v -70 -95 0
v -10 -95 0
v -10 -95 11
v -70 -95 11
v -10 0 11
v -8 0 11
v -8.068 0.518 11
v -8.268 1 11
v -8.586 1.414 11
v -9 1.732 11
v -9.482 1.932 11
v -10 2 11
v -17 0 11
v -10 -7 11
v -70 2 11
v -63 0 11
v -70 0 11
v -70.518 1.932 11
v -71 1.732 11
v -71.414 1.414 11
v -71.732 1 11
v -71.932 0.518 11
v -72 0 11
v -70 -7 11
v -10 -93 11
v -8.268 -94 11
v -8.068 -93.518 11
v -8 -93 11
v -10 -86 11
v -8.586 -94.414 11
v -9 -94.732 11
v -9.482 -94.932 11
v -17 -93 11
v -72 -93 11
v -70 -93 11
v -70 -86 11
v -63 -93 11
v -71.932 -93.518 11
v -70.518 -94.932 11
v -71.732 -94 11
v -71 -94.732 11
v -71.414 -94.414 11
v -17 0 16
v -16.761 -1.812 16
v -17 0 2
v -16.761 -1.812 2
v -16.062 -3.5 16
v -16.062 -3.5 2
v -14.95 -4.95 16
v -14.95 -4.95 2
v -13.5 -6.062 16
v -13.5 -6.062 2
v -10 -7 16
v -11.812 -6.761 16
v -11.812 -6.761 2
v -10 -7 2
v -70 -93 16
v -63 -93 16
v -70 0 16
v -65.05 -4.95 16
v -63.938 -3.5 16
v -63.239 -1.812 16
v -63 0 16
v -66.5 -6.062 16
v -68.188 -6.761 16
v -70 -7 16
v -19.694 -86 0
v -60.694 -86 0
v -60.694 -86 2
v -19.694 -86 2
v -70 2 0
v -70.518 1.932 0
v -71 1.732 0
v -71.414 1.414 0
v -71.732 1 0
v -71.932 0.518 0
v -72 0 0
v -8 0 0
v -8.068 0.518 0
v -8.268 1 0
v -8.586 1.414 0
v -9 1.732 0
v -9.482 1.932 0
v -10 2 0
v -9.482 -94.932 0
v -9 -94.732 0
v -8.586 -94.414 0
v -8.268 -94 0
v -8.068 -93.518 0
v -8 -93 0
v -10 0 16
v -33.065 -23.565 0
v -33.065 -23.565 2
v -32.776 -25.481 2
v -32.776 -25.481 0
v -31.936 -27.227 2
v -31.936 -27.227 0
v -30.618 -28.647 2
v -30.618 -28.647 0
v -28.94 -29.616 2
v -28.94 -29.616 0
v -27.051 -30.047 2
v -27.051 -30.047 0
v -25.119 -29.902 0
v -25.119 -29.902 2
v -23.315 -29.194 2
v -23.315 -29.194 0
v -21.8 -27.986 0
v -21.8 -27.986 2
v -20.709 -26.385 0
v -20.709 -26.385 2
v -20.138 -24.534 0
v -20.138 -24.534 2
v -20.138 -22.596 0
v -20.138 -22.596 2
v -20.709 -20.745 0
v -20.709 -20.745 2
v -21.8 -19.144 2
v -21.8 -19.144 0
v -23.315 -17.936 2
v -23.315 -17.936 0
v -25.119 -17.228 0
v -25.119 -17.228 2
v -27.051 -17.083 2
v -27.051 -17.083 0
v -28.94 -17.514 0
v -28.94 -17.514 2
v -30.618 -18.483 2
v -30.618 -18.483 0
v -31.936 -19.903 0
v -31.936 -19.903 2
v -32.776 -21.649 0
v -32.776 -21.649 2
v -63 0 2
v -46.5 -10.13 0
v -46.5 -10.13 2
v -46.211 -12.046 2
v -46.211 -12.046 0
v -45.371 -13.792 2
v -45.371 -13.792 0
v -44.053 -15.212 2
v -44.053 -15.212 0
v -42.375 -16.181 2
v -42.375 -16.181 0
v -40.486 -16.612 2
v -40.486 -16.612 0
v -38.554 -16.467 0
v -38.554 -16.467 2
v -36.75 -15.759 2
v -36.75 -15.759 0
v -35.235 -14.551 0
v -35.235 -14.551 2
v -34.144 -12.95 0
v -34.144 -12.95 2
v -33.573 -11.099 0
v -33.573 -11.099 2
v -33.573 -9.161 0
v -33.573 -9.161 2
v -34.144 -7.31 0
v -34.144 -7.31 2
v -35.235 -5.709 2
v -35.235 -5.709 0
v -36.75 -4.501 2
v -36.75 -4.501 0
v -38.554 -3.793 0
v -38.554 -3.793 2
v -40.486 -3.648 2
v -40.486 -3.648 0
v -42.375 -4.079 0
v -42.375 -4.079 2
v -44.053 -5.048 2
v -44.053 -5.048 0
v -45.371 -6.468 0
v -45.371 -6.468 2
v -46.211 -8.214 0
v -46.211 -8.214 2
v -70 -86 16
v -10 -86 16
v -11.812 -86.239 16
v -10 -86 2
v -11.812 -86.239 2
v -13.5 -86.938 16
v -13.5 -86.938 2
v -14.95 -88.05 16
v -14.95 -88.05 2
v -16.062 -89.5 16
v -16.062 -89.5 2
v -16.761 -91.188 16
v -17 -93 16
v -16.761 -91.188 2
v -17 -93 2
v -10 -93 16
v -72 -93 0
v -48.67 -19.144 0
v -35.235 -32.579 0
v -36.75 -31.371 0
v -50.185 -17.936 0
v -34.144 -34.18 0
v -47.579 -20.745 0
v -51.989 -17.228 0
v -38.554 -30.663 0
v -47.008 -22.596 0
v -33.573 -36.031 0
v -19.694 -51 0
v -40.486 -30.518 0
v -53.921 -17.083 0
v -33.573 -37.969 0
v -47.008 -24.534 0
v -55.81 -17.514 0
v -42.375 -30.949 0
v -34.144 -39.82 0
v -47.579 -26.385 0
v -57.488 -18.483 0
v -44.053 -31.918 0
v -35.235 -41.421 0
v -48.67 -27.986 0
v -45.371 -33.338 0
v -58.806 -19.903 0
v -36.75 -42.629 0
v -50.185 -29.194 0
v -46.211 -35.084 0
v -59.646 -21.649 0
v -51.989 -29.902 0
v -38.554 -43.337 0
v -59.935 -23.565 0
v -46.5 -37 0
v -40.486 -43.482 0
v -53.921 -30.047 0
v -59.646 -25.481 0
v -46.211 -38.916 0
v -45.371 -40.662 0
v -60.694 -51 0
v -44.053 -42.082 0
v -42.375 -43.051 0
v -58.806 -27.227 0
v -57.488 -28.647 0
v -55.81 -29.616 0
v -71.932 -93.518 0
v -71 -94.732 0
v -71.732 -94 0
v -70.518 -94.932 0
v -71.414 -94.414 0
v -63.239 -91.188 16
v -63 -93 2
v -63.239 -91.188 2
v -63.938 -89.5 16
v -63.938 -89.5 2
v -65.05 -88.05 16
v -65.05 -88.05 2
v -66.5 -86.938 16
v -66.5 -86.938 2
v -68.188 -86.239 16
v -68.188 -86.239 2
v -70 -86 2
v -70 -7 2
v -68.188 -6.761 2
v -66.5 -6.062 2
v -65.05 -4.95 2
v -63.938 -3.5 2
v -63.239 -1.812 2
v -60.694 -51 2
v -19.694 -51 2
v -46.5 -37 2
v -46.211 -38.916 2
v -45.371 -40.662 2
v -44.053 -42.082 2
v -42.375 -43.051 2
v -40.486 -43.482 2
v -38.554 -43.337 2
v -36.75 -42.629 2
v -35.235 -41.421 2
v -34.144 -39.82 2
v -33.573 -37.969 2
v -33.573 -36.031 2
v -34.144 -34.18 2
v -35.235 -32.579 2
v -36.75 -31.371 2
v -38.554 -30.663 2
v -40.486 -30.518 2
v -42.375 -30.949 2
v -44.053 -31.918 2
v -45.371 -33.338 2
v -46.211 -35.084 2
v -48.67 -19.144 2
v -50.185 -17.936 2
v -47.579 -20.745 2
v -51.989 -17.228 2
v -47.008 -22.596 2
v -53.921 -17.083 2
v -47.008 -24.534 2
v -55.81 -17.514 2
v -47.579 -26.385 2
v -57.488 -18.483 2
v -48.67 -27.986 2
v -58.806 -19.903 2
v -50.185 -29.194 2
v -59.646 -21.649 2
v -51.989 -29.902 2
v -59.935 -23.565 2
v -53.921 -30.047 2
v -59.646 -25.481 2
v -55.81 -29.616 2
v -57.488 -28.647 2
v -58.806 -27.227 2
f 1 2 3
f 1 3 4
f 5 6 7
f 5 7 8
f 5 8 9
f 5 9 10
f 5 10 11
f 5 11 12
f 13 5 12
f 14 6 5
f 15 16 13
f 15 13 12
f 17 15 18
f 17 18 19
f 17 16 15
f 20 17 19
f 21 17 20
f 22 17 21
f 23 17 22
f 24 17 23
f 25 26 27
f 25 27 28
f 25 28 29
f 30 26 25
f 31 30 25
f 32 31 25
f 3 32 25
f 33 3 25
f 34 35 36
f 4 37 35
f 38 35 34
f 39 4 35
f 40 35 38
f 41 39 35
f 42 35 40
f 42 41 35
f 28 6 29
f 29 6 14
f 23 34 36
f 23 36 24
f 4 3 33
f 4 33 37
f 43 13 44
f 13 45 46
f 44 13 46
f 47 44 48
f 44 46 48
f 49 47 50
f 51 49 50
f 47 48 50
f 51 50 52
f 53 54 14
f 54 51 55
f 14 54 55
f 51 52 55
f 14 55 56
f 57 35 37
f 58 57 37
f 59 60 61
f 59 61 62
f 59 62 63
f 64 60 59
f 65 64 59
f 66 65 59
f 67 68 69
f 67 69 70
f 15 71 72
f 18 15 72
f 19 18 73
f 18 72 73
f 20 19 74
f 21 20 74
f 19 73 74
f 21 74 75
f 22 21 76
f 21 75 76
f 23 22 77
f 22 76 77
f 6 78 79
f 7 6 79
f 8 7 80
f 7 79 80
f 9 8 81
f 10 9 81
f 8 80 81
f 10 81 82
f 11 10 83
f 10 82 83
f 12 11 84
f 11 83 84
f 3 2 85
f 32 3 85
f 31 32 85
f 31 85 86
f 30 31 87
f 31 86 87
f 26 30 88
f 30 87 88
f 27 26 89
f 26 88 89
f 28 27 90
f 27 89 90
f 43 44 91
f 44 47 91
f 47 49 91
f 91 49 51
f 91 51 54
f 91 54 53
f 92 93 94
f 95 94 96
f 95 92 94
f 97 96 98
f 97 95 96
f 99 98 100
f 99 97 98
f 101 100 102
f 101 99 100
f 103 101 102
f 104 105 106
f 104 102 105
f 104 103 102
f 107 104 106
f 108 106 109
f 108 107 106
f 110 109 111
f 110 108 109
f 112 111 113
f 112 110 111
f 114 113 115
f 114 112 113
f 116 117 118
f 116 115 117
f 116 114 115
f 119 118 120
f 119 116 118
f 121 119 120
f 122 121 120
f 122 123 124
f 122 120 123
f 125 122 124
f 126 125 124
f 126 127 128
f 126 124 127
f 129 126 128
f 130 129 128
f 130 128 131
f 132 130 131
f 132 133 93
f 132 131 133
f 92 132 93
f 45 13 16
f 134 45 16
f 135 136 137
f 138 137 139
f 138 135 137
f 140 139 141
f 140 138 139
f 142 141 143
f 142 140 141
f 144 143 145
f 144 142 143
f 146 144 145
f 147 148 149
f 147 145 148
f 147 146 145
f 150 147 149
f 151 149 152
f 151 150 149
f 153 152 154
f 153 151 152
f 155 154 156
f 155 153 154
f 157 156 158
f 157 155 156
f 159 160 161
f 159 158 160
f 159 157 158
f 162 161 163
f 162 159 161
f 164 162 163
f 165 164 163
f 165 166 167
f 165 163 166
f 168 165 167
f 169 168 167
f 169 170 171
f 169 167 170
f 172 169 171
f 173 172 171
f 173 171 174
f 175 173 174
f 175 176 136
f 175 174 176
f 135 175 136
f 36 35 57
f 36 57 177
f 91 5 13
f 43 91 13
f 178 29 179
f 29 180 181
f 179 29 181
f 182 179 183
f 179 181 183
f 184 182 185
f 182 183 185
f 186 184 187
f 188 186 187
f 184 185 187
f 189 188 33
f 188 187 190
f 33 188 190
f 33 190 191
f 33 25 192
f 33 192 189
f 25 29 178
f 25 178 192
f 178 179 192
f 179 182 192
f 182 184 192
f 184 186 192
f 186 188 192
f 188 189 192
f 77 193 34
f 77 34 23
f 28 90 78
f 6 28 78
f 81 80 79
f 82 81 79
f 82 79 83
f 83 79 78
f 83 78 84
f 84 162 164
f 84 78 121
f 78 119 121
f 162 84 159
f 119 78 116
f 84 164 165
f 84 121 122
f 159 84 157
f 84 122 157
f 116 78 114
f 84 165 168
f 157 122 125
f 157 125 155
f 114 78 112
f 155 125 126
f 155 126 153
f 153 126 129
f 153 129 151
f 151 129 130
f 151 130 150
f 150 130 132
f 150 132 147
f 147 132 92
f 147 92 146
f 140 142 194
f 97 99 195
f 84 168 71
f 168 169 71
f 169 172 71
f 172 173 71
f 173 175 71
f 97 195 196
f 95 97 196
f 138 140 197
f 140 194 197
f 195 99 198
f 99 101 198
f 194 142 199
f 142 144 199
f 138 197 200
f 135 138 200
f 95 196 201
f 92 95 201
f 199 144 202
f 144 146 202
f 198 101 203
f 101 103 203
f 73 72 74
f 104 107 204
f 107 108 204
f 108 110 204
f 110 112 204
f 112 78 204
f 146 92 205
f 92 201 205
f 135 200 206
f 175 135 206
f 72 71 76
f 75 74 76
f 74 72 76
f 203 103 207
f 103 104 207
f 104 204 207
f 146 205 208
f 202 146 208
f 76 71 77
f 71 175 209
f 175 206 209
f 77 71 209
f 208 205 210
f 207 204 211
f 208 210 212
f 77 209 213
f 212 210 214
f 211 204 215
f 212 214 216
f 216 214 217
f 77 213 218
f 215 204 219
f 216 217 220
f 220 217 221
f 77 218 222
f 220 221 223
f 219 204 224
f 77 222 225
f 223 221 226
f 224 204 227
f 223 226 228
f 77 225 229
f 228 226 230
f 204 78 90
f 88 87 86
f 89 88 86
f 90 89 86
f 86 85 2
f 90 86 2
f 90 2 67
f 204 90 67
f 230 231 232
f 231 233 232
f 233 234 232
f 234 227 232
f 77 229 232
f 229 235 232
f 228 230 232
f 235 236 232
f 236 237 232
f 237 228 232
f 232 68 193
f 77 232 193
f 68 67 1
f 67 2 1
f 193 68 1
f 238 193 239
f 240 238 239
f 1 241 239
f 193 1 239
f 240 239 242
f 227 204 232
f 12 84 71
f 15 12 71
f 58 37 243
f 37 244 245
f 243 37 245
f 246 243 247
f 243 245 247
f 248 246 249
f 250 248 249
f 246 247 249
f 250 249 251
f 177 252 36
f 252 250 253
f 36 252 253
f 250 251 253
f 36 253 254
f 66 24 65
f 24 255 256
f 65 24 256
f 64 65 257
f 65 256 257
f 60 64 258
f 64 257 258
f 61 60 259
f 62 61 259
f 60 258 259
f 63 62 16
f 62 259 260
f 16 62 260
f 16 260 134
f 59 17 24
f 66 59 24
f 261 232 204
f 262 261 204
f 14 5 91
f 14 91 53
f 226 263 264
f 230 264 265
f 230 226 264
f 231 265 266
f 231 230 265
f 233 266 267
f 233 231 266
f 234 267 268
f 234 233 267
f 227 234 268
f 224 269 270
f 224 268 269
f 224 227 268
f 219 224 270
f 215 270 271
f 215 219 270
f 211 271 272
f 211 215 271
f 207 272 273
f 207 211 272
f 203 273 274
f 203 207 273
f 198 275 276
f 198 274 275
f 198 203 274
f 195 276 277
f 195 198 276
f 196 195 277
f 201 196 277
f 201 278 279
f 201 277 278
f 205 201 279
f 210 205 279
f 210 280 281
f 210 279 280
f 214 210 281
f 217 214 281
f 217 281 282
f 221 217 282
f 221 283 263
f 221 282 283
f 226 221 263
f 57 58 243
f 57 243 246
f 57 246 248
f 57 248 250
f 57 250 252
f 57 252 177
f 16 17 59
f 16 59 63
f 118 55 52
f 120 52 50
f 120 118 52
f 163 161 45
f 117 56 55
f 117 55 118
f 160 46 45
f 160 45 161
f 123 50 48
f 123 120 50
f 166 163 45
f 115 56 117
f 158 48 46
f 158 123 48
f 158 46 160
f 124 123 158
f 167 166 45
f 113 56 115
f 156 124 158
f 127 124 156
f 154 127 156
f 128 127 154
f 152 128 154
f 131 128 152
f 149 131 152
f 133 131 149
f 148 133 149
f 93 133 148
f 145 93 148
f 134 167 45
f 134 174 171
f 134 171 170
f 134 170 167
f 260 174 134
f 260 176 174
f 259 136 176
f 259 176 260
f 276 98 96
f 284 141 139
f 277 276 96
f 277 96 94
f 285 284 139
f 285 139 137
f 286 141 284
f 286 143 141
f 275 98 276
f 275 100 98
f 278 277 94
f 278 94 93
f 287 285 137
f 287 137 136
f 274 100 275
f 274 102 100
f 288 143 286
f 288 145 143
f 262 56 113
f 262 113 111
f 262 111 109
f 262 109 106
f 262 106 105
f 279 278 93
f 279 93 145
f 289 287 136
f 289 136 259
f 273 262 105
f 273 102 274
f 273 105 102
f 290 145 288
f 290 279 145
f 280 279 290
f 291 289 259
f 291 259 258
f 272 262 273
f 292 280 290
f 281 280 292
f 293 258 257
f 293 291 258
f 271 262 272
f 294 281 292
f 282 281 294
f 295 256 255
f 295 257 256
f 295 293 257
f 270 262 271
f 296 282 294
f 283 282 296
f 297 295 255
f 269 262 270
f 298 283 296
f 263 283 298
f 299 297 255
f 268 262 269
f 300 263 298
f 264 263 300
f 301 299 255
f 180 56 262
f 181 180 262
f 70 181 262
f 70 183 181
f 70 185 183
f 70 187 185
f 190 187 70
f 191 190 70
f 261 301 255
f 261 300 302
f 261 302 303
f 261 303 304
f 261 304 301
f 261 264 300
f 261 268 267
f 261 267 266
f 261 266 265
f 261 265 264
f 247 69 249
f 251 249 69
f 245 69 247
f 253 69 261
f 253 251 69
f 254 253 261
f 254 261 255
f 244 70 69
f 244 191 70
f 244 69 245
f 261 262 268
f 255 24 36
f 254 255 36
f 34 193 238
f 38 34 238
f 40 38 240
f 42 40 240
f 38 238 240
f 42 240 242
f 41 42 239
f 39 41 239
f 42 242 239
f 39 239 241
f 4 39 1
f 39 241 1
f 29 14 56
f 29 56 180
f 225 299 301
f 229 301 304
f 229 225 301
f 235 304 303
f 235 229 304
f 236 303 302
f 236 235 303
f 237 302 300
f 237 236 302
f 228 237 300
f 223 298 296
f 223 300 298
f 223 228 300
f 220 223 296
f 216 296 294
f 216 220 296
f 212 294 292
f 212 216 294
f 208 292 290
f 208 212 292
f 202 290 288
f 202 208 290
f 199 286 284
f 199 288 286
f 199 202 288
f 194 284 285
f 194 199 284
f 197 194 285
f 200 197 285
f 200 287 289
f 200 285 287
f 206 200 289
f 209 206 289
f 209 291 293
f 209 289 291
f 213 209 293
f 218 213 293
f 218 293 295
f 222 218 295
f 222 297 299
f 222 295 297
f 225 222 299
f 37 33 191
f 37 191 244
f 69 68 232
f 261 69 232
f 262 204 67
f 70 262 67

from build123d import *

# Parameters (mm, degrees)
PAD001_DEPTH            = 11
SKETCH002_W             = 60
SKETCH002_H             = 93
POCKET001_DEPTH         = 9
SKETCH004_R             = 6.5
POCKET002_DEPTH         = 5
PAD002_DEPTH            = 14
BODY003_PLACEMENT_ANGLE = 180


with BuildPart() as part:
    # Sketch003 → Pad001 (new body)
    with BuildSketch(Plane.XY):
        with BuildLine():
            ThreePointArc((0, 2), (-1.414214, 1.414214), (-2, 0))
            Line((-2, 0), (-2, -93))
            ThreePointArc((-2, -93), (-1.414207, -94.414201), (0, -94.999981))
            Line((0, -94.999981), (60, -94.999981))
            ThreePointArc((60, -94.999981), (61.414214, -94.414194), (62, -92.999981))
            Line((62, 0), (62, -92.999981))
            ThreePointArc((62, 0), (61.414214, 1.414214), (60, 2))
            Line((0, 2), (60, 2))
        make_face()
    extrude(amount=PAD001_DEPTH)

    # Sketch002 (on Face10 of Pad001) → Pocket001 (cut)
    with BuildSketch(Plane.XY.offset(11)):
        with Locations((30, -46.5)):
            Rectangle(SKETCH002_W, SKETCH002_H)
    extrude(amount=-POCKET001_DEPTH, mode=Mode.SUBTRACT)

    # Sketch004 → Pocket002 (cut)
    with BuildSketch(Plane.XY):
        with Locations((30, -56)):
            Circle(SKETCH004_R)
        with Locations((43.435029, -69.435029)):
            Circle(SKETCH004_R)
        with Locations((16.564971, -69.435029)):
            Circle(SKETCH004_R)
        with Locations((30, -82.870058)):
            Circle(SKETCH004_R)
        Polygon((50.693539, -7), (50.693539, -42), (9.693539, -42), (9.693539, -7), (30.193539, -7), align=None)
    extrude(amount=POCKET002_DEPTH, mode=Mode.SUBTRACT)

    # Sketch006 (on Face24 of Pocket002) → Pad002 (join)
    with BuildSketch(Plane.XY.offset(2)):
        with BuildLine():
            Line((0, 0), (7, 0))
            ThreePointArc((0, -7), (4.949747, -4.949747), (7, 0))
            Line((0, -7), (0, 0))
        make_face()
        with BuildLine():
            Line((60, 0), (53, 0))
            ThreePointArc((53, 0), (55.050253, -4.949747), (60, -7))
            Line((60, 0), (60, -7))
        make_face()
        with BuildLine():
            Line((0, -93), (0, -86))
            ThreePointArc((7, -93), (4.949747, -88.050253), (0, -86))
            Line((0, -93), (7, -93))
        make_face()
        with BuildLine():
            Line((60, -93), (60, -86))
            ThreePointArc((60, -86), (55.050253, -88.050253), (53, -93))
            Line((60, -93), (53, -93))
        make_face()
    extrude(amount=PAD002_DEPTH)


with BuildPart() as part_1:
    # Body003 placement: moved
    add(part.part.moved(Location((-10, -93, 0))).rotate(Axis((-10, -93, 0), (0, 0, 1)), BODY003_PLACEMENT_ANGLE))


solid = part_1.part
